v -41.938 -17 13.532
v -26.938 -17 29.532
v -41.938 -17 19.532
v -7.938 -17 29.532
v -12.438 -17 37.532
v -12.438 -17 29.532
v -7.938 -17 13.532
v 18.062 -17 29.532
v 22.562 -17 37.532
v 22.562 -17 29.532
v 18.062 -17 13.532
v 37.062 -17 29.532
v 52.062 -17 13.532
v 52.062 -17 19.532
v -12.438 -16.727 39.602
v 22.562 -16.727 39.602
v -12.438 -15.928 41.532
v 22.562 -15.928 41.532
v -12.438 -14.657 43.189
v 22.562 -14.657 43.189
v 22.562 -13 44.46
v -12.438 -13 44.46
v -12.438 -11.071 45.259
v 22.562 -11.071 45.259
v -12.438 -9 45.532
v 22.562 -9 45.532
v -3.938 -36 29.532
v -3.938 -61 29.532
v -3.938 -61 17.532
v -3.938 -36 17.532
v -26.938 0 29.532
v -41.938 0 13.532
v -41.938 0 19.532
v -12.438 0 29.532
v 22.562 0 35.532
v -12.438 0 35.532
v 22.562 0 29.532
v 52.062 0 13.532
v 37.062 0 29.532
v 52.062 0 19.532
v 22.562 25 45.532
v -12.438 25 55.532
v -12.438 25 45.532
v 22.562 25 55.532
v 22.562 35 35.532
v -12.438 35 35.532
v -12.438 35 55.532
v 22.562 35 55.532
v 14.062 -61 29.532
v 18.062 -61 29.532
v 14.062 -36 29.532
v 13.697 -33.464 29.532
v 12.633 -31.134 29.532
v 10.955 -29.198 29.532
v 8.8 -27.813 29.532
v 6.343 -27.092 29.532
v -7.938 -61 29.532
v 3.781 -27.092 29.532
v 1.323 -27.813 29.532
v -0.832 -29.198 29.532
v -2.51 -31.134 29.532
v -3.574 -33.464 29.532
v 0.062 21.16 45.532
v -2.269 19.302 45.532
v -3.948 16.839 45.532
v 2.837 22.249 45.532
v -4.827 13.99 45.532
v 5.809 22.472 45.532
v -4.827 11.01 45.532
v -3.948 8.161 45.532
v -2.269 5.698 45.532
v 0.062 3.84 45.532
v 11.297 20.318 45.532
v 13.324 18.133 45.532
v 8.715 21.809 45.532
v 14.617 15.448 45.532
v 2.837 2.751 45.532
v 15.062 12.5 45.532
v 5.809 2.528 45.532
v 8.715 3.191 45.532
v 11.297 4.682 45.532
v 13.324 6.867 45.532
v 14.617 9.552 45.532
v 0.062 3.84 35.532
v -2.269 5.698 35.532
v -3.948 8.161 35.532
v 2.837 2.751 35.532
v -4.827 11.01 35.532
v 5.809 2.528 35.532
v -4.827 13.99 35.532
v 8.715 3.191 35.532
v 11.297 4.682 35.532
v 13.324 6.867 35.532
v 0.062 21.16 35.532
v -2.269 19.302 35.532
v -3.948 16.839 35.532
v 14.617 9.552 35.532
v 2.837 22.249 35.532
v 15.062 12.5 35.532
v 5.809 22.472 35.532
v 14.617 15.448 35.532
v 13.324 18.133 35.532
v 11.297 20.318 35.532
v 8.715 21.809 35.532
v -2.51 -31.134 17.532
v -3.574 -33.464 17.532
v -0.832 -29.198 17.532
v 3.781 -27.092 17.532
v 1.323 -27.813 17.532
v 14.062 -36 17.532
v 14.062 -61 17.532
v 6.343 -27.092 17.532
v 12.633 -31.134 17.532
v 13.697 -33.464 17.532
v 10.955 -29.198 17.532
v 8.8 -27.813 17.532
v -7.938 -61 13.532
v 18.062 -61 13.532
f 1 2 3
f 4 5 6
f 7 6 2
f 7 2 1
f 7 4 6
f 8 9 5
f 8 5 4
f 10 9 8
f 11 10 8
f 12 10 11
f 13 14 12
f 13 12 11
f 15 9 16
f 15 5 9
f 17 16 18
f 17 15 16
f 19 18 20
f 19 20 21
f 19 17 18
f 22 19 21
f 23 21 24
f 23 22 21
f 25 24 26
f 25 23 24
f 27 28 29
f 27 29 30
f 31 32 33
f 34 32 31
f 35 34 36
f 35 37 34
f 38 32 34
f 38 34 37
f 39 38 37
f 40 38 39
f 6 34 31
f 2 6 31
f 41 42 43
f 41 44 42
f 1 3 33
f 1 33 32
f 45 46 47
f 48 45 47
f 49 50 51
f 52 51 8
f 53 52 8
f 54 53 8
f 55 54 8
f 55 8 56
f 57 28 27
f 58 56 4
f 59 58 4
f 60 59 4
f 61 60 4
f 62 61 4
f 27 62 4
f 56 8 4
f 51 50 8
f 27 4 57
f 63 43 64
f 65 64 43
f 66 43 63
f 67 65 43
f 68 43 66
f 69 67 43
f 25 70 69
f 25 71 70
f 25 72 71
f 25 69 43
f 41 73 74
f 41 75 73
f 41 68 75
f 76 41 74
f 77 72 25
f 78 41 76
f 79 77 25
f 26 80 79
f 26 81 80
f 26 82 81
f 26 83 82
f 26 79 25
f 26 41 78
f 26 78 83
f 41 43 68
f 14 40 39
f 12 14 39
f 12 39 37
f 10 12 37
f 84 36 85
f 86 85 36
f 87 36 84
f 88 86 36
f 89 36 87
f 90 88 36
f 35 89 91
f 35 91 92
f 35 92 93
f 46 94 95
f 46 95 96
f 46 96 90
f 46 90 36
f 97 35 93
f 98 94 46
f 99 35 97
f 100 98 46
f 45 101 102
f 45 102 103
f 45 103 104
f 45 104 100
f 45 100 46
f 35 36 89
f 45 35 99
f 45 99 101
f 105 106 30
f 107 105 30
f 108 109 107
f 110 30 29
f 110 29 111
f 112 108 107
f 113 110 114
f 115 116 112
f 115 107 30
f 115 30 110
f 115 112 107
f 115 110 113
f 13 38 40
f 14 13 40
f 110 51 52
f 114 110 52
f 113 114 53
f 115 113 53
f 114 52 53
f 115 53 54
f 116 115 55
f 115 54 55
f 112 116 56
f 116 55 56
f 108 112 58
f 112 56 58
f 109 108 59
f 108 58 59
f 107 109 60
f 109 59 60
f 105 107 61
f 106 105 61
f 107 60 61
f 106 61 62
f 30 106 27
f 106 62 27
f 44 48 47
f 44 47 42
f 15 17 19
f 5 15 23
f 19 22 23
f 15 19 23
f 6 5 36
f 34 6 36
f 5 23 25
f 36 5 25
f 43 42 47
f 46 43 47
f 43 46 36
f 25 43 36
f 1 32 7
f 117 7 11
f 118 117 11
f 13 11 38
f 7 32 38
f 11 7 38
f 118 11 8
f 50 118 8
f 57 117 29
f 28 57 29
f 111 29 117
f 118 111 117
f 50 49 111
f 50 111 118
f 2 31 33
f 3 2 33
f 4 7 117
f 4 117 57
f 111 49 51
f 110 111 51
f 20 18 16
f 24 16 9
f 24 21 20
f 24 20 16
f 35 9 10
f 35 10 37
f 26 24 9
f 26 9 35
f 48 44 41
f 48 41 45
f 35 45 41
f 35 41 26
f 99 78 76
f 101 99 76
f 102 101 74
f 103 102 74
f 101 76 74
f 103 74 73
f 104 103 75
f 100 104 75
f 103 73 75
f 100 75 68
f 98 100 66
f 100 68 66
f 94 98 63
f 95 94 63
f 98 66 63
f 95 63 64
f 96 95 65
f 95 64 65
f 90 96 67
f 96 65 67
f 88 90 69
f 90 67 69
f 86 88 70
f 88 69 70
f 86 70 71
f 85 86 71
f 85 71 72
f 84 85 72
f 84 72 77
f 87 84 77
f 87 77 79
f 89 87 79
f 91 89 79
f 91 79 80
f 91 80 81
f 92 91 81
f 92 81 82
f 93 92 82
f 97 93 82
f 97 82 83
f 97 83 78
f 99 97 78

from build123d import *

# Parameters (mm, degrees)
F1_DEPTH  = 17
F2_W      = 26
F2_H      = 16
F3_DEPTH  = 44
F4_W      = 18
F4_H      = 25
F5_DEPTH  = 12
F8_DEPTH  = 17.5
F9_R      = 8
F10_R     = 10
F11_DEPTH = 25


# Not quite as in the source:
# - the program builds the solid bodies; features that only make, move or delete a surface that nothing else refers to are left out


with BuildPart() as f1:
    # F0 (on Front) → F1 (new body)
    with BuildSketch(Plane.XZ):
        Polygon((52.0617456436, 19.5316821036), (37.0617456436, 29.5316821036), (-26.9382543564, 29.5316821036), (-41.9382543564, 19.5316821036), (-41.9382543564, 13.5316821036), (52.0617456436, 13.5316821036), align=None)
    extrude(amount=F1_DEPTH)

    # F2 (on face) → F3 (join)
    with BuildSketch(Plane.XZ.offset(17)):
        with Locations((5.0617456436, 21.5316821036)):
            Rectangle(F2_W, F2_H)
    extrude(amount=F3_DEPTH)

    # F4 (on face) → F5 (cut)
    with BuildSketch(Plane.XY.offset(29.5316821036)):
        with Locations((5.0617456436, -48.5)):
            Rectangle(F4_W, F4_H)
        with BuildLine():
            Line((-3.9382543564, -36), (14.0617456436, -36))
            ThreePointArc((14.0617456436, -36), (5.0617456436, -27), (-3.9382543564, -36))
        make_face()
    extrude(amount=-F5_DEPTH, mode=Mode.SUBTRACT)

    # F7 (on offset) → F8 (join, symmetric)
    with BuildSketch(Plane.YZ.offset(5.0617456436)):
        Polygon((-17, 45.5316821036), (-17, 29.5316821036), (0, 29.5316821036), (0, 35.5316821036), (35, 35.5316821036), (35, 55.5316821036), (25, 55.5316821036), (25, 45.5316821036), align=None)
    extrude(amount=F8_DEPTH, both=True)

    # F9
    f9_edges = [f1.edges().sort_by_distance(p)[0] for p in [
        (5.061746, -17, 45.531682),
    ]]
    fillet(f9_edges, radius=F9_R)

    # F10 (on face) → F11 (cut)
    with BuildSketch(Plane.XY.offset(45.5316821036)):
        with Locations((5.0617456436, 12.5)):
            Circle(F10_R)
    extrude(amount=-F11_DEPTH, mode=Mode.SUBTRACT)


solid = f1.part
